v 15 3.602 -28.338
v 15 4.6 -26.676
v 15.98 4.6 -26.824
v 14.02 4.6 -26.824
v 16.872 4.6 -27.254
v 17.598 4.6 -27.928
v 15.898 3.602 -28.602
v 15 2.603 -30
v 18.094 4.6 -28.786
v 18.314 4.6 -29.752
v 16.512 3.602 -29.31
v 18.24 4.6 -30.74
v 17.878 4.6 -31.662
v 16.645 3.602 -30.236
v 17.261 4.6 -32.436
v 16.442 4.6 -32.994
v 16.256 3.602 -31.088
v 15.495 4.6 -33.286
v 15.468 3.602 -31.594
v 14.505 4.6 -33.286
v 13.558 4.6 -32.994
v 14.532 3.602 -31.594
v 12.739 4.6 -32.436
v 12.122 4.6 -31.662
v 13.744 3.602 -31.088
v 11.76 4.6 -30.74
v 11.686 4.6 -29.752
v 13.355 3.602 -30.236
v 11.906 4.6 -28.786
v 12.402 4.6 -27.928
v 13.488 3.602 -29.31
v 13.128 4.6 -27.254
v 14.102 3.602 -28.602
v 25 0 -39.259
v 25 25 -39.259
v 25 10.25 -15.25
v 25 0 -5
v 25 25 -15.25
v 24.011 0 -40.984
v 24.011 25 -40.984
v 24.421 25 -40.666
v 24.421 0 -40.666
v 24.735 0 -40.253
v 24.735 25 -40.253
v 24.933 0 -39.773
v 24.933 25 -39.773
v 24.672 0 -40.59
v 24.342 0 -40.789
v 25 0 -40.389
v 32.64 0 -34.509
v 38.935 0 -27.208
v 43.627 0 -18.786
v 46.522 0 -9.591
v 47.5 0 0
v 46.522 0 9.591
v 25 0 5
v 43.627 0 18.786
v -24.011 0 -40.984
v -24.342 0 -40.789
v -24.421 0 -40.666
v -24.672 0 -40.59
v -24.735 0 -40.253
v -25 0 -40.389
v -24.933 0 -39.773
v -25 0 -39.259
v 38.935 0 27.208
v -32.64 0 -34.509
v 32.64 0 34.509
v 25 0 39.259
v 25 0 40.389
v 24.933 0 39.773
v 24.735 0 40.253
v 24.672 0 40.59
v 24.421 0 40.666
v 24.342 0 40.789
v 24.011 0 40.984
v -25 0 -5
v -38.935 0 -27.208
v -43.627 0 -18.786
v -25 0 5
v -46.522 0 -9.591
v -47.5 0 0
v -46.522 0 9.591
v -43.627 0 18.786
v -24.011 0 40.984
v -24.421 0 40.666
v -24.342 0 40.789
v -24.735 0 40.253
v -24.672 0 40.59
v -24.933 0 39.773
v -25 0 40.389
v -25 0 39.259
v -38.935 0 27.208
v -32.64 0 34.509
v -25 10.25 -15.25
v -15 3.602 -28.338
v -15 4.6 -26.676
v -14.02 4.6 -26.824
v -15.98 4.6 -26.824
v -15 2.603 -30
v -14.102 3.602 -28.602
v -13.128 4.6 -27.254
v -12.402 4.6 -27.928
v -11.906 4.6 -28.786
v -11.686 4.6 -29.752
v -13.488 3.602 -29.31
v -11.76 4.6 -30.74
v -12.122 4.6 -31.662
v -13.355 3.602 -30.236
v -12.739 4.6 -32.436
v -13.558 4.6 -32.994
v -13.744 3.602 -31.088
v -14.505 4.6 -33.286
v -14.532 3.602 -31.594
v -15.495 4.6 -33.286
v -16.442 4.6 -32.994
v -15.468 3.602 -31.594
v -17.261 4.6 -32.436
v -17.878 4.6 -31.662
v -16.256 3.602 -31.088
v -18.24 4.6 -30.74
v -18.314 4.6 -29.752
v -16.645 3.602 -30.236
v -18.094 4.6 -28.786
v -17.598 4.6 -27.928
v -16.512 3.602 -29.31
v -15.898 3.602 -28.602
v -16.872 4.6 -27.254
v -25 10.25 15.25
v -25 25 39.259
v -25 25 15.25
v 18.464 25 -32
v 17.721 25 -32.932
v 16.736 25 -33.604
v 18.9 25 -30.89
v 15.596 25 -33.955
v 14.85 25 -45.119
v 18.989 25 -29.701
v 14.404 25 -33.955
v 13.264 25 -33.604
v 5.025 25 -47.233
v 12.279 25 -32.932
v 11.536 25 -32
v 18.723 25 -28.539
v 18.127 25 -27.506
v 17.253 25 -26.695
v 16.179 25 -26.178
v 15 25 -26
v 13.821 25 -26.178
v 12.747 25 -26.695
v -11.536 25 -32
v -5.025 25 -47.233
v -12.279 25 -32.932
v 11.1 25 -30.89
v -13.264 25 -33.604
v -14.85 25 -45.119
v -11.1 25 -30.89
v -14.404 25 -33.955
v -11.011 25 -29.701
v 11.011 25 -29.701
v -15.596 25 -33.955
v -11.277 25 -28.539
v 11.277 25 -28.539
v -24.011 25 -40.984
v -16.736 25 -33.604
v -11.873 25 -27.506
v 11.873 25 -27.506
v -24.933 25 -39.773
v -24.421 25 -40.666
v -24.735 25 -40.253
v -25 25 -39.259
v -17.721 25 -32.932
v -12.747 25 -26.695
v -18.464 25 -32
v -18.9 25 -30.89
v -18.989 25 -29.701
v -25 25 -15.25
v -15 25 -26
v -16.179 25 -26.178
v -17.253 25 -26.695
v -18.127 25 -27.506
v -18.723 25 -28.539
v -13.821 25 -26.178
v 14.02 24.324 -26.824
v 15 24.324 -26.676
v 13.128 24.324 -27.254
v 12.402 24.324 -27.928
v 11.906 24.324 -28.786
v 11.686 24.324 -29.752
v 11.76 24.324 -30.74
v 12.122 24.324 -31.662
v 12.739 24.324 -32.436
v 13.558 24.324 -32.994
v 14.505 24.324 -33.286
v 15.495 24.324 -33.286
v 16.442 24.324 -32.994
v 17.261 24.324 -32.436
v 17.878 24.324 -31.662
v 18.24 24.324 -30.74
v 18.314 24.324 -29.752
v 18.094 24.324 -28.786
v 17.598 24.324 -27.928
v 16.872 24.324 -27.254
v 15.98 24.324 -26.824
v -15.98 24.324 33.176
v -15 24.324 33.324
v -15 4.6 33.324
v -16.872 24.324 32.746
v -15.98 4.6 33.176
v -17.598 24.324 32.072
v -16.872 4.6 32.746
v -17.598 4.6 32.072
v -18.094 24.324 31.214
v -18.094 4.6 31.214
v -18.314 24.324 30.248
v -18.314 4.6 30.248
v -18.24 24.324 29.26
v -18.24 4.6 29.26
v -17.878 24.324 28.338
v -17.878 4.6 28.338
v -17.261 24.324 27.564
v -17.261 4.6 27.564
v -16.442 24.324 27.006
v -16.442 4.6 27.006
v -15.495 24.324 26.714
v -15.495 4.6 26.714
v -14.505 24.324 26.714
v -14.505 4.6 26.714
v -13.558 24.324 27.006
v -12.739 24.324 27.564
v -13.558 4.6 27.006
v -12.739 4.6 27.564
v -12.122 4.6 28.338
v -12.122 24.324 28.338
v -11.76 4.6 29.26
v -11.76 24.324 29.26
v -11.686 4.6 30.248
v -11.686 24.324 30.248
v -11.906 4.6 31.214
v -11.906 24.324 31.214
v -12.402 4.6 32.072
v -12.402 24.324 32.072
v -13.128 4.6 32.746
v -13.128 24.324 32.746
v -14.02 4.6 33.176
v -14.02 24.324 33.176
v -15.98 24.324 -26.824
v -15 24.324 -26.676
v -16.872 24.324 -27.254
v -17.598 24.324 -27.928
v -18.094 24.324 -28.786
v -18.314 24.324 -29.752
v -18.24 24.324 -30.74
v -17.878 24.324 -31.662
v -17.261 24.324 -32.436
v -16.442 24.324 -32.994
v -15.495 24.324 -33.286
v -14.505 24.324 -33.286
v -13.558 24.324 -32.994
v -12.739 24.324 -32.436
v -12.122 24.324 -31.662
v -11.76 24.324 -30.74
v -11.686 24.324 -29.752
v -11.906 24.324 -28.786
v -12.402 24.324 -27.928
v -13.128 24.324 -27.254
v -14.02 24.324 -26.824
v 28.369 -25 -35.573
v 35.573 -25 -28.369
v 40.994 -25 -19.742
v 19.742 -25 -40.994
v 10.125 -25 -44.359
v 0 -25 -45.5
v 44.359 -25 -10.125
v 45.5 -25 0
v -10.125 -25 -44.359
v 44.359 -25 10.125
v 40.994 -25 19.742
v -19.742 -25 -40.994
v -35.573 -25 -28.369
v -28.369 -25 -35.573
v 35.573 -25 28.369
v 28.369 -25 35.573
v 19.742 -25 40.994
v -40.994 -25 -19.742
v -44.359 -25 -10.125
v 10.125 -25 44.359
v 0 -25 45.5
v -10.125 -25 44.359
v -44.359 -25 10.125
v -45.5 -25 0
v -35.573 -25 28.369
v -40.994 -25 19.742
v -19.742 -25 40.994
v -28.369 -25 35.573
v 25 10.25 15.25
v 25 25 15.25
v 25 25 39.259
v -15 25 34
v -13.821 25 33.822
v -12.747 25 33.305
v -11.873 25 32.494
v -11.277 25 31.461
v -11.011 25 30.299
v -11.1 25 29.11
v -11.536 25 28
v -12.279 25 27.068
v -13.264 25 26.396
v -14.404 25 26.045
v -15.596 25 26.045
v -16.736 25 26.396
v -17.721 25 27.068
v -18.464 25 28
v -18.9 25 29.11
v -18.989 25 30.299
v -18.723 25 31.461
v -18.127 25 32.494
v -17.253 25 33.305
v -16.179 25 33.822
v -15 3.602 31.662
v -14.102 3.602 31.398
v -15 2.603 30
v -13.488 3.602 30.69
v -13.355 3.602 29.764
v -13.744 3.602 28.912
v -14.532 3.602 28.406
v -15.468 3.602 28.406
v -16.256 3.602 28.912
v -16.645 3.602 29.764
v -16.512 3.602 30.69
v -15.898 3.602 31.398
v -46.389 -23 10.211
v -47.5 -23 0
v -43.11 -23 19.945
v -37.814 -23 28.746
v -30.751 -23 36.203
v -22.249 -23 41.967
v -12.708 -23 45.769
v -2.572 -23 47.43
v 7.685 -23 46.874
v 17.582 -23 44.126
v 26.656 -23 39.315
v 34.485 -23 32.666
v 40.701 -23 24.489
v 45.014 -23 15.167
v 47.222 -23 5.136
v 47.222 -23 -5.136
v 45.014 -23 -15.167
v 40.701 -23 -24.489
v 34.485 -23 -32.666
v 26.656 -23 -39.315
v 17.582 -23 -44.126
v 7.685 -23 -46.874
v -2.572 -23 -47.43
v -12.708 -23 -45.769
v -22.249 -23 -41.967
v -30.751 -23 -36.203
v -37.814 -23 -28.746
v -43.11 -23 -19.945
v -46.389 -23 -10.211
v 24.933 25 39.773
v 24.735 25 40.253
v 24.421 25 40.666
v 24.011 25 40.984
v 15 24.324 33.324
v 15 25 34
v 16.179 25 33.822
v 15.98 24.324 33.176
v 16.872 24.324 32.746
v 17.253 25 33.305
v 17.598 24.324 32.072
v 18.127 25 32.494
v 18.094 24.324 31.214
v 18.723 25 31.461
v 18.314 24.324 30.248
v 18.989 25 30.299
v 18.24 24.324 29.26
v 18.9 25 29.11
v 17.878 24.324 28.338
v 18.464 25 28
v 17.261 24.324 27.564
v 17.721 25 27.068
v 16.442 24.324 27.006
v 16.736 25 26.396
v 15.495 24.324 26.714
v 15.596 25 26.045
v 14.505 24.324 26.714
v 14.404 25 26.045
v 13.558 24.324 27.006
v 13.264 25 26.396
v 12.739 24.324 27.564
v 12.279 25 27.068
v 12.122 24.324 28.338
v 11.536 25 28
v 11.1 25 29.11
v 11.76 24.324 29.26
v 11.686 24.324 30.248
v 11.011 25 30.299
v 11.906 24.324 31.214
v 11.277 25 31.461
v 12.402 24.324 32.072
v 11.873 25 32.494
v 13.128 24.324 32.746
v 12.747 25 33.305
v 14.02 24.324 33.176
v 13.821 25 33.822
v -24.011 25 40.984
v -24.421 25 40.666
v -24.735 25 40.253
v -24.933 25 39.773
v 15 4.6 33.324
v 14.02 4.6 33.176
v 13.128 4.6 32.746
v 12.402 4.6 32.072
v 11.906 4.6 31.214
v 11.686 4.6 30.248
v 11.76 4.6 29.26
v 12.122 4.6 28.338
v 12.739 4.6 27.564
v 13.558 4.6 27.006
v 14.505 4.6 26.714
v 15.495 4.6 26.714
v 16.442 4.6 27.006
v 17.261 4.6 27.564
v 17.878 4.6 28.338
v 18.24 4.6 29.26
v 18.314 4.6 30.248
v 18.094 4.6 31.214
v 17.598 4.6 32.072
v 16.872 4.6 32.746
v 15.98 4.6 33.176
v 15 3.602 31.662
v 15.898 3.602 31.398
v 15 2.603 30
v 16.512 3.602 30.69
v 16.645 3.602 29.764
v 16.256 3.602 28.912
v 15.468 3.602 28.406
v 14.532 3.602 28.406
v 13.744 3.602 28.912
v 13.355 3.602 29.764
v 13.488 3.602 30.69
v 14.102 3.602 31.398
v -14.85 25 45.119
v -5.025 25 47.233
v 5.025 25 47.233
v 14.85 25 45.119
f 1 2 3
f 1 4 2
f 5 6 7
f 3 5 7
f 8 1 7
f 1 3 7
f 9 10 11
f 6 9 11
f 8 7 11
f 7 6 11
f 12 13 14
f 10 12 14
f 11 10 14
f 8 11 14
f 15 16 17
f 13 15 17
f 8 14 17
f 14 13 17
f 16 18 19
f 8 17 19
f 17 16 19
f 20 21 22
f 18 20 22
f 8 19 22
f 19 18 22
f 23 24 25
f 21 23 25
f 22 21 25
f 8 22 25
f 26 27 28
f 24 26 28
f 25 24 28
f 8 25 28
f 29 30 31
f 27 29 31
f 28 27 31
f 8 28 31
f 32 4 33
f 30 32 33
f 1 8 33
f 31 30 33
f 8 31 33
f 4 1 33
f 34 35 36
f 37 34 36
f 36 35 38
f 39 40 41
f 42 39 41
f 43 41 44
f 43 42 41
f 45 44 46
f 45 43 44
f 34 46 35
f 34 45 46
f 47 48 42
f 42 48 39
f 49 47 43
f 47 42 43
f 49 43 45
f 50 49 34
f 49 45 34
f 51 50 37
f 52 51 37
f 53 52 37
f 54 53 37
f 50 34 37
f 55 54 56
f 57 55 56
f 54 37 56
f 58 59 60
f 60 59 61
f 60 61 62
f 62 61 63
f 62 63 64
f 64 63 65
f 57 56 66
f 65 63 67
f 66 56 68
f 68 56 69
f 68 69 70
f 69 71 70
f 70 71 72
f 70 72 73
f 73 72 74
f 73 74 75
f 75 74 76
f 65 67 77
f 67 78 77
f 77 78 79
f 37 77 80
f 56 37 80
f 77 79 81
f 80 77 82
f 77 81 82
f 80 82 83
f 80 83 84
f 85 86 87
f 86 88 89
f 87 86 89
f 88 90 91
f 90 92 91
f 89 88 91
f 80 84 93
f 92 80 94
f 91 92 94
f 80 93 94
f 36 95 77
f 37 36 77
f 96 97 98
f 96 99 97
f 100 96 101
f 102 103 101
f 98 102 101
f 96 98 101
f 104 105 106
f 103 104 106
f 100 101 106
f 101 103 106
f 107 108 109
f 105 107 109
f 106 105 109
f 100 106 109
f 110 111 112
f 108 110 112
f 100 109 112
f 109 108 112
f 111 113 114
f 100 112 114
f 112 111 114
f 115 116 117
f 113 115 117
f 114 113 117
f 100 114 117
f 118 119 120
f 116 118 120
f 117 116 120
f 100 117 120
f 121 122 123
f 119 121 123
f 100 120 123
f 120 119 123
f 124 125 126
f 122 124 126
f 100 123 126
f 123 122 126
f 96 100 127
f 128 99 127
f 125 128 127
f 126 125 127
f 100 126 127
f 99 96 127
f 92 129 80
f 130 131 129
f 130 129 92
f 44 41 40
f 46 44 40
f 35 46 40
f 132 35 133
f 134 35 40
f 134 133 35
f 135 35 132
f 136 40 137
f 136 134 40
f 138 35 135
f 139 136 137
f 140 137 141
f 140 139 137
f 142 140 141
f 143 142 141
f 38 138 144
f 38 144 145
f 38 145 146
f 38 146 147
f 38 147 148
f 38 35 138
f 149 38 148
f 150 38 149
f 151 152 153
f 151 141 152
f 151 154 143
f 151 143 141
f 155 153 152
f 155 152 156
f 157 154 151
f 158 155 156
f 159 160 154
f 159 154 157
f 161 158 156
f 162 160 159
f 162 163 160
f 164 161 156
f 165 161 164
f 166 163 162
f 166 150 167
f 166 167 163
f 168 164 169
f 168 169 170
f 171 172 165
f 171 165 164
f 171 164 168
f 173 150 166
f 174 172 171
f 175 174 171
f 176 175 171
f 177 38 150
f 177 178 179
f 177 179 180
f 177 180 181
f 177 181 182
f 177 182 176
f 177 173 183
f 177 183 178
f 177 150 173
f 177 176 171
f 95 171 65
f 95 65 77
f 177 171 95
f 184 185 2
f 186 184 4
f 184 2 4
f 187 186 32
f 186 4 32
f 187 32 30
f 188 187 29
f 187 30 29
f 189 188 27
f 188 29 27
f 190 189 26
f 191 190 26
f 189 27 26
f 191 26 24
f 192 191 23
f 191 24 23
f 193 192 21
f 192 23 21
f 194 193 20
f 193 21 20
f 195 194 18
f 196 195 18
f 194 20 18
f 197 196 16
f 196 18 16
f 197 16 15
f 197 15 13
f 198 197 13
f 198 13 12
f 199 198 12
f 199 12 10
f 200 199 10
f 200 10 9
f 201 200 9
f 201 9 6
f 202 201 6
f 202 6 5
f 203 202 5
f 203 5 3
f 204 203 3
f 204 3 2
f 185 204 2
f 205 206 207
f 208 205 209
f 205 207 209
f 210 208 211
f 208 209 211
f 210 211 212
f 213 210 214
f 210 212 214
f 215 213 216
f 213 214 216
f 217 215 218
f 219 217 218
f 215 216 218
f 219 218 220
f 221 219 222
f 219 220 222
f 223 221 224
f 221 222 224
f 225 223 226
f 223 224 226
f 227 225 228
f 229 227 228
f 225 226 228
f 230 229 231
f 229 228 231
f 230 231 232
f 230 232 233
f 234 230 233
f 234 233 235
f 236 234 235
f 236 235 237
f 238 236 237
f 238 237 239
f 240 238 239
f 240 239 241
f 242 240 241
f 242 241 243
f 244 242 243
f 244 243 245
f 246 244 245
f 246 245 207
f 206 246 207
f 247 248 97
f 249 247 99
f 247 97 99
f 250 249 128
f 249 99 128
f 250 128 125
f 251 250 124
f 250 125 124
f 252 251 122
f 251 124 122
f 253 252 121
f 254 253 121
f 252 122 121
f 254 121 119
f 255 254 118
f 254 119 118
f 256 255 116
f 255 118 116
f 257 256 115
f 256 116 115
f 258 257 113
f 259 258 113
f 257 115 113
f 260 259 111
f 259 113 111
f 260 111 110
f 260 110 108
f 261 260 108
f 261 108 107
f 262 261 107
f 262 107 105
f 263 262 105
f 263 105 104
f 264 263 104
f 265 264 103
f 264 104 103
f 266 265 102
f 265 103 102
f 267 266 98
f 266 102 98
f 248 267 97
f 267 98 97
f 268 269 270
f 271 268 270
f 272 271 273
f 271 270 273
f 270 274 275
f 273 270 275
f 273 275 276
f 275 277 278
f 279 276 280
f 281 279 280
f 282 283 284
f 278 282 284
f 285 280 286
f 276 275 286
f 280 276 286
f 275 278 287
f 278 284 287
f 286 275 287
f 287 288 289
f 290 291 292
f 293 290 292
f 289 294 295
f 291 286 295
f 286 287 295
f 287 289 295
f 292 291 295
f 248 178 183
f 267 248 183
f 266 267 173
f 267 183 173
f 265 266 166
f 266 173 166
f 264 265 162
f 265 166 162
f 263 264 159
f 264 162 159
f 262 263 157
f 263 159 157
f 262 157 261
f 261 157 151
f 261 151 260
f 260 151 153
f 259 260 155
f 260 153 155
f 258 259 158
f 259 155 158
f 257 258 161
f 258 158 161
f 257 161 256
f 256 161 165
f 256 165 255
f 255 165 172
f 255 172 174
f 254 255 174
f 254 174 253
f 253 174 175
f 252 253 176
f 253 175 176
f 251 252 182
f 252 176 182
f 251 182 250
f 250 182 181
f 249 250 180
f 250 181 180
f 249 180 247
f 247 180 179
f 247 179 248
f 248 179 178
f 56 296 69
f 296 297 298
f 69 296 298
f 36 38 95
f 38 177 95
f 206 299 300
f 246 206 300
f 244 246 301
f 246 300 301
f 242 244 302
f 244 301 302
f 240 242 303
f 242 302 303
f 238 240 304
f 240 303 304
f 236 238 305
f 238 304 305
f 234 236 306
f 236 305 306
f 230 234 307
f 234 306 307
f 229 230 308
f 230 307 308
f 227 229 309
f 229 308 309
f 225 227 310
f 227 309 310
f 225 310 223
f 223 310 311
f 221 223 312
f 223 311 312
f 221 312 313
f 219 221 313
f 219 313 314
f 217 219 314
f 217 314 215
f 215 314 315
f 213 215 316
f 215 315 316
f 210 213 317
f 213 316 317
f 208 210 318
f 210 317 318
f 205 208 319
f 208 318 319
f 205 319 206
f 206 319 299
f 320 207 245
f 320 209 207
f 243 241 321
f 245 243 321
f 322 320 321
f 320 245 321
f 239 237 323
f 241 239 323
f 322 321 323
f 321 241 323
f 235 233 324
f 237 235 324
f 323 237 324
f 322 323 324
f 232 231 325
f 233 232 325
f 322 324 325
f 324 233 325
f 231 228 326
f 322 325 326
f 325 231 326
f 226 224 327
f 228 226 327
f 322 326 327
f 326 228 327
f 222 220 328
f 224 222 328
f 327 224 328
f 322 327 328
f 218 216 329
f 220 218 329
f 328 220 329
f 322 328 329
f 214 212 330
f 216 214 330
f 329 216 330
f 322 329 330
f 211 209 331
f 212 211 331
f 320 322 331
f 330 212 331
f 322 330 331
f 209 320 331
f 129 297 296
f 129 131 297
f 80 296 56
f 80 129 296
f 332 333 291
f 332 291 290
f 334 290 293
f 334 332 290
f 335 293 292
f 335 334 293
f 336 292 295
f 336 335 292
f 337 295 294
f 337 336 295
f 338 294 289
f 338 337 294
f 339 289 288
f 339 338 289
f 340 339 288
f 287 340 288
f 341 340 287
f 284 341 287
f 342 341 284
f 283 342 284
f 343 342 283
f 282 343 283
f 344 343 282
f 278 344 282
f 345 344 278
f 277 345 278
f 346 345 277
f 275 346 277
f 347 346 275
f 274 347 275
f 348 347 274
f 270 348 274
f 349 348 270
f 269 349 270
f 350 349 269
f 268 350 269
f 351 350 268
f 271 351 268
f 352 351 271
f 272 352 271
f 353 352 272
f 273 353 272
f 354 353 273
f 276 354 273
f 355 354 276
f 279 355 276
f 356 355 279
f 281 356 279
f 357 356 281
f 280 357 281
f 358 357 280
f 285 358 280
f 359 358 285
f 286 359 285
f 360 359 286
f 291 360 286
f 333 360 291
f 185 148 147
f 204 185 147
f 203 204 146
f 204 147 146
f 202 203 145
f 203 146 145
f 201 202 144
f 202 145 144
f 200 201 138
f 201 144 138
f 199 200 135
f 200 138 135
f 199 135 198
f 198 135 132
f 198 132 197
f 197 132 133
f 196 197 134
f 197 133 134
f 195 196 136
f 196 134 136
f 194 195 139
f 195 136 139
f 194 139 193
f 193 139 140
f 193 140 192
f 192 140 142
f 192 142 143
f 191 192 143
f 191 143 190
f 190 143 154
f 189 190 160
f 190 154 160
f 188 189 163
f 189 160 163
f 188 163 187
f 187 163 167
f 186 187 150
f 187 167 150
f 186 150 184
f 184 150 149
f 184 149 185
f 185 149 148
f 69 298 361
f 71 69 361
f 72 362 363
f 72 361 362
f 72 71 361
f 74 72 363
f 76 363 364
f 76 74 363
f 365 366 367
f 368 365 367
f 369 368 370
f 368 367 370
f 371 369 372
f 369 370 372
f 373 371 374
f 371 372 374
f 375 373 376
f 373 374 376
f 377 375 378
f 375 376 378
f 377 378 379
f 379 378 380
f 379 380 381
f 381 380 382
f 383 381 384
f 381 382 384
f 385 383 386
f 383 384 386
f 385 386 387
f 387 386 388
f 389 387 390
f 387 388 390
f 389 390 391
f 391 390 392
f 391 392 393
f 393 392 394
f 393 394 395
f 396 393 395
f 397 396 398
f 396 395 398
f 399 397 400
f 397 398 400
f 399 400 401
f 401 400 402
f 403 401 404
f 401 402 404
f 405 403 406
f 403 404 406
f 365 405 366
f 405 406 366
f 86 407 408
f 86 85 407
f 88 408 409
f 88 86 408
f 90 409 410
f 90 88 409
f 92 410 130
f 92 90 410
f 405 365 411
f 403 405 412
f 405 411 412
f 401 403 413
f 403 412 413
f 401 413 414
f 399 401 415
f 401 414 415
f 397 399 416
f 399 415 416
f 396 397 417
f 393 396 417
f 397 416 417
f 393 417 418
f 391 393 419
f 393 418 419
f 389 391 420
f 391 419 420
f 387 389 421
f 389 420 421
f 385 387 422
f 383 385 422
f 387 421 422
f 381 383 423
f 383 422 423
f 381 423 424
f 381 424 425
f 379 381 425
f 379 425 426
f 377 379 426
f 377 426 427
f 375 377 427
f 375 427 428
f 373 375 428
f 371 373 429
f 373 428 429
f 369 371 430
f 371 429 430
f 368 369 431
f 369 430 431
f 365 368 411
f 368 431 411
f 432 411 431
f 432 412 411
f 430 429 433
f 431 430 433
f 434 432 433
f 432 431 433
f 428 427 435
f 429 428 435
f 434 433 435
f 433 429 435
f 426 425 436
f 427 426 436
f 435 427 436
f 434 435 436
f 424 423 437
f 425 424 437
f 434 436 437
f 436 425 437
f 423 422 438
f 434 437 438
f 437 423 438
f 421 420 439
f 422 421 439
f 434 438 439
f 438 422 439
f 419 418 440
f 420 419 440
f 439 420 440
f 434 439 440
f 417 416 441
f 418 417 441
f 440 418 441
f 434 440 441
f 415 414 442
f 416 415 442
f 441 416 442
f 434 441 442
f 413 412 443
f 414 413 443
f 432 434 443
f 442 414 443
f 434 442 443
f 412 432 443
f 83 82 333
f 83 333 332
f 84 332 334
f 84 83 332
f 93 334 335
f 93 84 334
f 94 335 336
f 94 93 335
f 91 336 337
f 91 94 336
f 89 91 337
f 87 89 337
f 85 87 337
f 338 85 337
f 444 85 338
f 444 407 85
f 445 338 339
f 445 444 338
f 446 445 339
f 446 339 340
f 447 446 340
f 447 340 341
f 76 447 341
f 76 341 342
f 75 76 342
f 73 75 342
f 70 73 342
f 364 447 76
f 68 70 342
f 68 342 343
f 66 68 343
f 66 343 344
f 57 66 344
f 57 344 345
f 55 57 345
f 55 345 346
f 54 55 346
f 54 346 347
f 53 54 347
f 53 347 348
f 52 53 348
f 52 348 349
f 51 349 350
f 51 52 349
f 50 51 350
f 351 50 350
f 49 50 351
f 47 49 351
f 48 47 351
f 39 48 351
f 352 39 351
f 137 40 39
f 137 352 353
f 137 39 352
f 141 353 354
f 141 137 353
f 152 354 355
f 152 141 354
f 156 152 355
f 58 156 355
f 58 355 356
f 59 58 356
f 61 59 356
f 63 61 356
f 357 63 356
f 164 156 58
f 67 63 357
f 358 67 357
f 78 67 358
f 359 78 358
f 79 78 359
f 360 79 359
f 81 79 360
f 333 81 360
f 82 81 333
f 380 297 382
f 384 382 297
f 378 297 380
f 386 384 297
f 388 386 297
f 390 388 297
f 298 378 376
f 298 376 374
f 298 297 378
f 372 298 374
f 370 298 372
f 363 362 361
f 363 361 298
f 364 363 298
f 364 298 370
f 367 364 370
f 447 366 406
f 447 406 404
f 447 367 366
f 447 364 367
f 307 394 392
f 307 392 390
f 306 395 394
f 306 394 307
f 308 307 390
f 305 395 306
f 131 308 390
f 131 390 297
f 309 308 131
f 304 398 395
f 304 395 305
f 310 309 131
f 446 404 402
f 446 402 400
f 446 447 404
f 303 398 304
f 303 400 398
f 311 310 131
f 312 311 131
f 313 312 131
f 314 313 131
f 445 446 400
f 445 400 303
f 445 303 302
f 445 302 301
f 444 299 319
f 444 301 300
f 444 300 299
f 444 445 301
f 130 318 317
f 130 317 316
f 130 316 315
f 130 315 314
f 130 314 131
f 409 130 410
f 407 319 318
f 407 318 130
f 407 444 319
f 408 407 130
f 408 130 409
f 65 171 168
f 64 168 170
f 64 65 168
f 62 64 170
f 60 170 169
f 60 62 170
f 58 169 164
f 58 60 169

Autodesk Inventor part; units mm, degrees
ref_plane "YZ Plane" through (0, 0, 0) normal (1, 0, 0) x (0, 1, 0)
ref_plane "XZ Plane" through (0, 0, 0) normal (0, 1, 0) x (-1, 0, 0)
ref_plane "XY Plane" through (0, 0, 0) normal (0, 0, 1) x (1, 0, 0)
sketch "Sketch1" plane through (0, 0, 0) normal (0, 1, 0) x (-1, 0, 0)
  circle A0 centre (0, 0) radius 47.5
  dimension "d0" = 95
extrude "Extrusion1" add sketch "Sketch1" along normal mid plane 50
sketch "Sketch4" plane through (0, 0, 0) normal (1, 0, 0) x (0, 1, 0)
  line L0 (-25, 47.5) -> (-25, -47.5) projected
  line L1 (25, -47.5) -> (25, 47.5) projected
  line L2 (-42, 0) -> (42, 0) projected
  line L3 (25, 15.25) -> (10.25, 15.25)
  line L4 (10.25, 15.25) -> (0, 5)
  line L5 (0, 5) -> (0, 0)
  line L6 (25, -15.25) -> (10.25, -15.25)
  line L7 (10.25, -15.25) -> (0, -5)
  line L8 (0, -5) -> (0, 0)
  dimension "d22" = 30.5
  dimension "d23" = 45
  dimension "d24" = 10
  dimension "d25" = 25
extrude "Extrusion3" cut sketch "Sketch4" along normal through all both and the other way through all
sketch "Sketch5" plane through (0, 25, 0) normal (0, 1, 0) x (1, 0, 0)
  line L0 (-66.5, 0) -> (66.5, 0) construction
  line L1 (0, 66.5) -> (0, -66.5) construction
  arc A0 (44.9854, 15.25) -> (-44.9854, 15.25) centre (0, 0) ccw construction
  line L2 (-47.5, 40.3887) -> (-25, 40.3887)
  line L3 (-25, 40.3887) -> (-25, -40.3887)
  line L4 (-25, -40.3887) -> (-47.5, -40.3887)
  line L5 (-47.5, -40.3887) -> (-47.5, 40.3887)
  arc A1 (-47.2361, 5) -> (-47.2361, -5) centre (0, 0) ccw projected
  line L6 (47.5, 40.3887) -> (25, 40.3887)
  line L7 (25, 40.3887) -> (25, -40.3887)
  line L8 (25, -40.3887) -> (47.5, -40.3887)
  line L9 (47.5, -40.3887) -> (47.5, 40.3887)
  arc A2 (47.2361, -5) -> (47.2361, 5) centre (0, 0) ccw
  dimension "d28" = 50
extrude "Extrusion4" cut sketch "Sketch5" against normal up to surface (25 mm away)
sketch "Sketch6" plane through (0, 25, 0) normal (0, 1, 0) x (1, 0, 0)
  line L0 (15, -30) -> (-15, -30) construction
  line L1 (-15, -30) -> (-15, 30) construction
  line L2 (-15, 30) -> (15, 30) construction
  line L3 (15, 30) -> (15, -30) construction
  line L4 (15, -30) -> (-15, 30) construction
  line L5 (-15, -30) -> (15, 30) construction
  point P0 (0, 0)
  dimension "d31" = 30
  dimension "d32" = 60
hole "Hole2" at (-15, 25, -30) at (15, 25, -30) at (-15, 25, 30) at (15, 25, 30) direction (0, -1, 0) diameter 6.647 depth 20.4 tip angle 118 countersink diameter 8 countersink angle 90 thread size "M8x1.25" class "6H" standard "ISO Metric profile"
fillet "Fillet1" radius 2 4 edges at (-25, 12.5, -40.3887) (-25, 12.5, 40.3887) (25, 12.5, -40.3887) (25, 12.5, 40.3887)
chamfer "Chamfer3" distance 2 angle 45 1 edges at (47.5, -25, 0)
sketch "Sketch7" plane through (0, -25, 0) normal (0, -1, 0) x (1, 0, 0)
  circle A0 centre (0, 0) radius 15 construction
  circle A1 centre (0, 0) radius 19 construction
  dimension "d44" = 4
  dimension "d45" = 30
mark "Mark1"
properties part number "HM1_FIXT2-001"
